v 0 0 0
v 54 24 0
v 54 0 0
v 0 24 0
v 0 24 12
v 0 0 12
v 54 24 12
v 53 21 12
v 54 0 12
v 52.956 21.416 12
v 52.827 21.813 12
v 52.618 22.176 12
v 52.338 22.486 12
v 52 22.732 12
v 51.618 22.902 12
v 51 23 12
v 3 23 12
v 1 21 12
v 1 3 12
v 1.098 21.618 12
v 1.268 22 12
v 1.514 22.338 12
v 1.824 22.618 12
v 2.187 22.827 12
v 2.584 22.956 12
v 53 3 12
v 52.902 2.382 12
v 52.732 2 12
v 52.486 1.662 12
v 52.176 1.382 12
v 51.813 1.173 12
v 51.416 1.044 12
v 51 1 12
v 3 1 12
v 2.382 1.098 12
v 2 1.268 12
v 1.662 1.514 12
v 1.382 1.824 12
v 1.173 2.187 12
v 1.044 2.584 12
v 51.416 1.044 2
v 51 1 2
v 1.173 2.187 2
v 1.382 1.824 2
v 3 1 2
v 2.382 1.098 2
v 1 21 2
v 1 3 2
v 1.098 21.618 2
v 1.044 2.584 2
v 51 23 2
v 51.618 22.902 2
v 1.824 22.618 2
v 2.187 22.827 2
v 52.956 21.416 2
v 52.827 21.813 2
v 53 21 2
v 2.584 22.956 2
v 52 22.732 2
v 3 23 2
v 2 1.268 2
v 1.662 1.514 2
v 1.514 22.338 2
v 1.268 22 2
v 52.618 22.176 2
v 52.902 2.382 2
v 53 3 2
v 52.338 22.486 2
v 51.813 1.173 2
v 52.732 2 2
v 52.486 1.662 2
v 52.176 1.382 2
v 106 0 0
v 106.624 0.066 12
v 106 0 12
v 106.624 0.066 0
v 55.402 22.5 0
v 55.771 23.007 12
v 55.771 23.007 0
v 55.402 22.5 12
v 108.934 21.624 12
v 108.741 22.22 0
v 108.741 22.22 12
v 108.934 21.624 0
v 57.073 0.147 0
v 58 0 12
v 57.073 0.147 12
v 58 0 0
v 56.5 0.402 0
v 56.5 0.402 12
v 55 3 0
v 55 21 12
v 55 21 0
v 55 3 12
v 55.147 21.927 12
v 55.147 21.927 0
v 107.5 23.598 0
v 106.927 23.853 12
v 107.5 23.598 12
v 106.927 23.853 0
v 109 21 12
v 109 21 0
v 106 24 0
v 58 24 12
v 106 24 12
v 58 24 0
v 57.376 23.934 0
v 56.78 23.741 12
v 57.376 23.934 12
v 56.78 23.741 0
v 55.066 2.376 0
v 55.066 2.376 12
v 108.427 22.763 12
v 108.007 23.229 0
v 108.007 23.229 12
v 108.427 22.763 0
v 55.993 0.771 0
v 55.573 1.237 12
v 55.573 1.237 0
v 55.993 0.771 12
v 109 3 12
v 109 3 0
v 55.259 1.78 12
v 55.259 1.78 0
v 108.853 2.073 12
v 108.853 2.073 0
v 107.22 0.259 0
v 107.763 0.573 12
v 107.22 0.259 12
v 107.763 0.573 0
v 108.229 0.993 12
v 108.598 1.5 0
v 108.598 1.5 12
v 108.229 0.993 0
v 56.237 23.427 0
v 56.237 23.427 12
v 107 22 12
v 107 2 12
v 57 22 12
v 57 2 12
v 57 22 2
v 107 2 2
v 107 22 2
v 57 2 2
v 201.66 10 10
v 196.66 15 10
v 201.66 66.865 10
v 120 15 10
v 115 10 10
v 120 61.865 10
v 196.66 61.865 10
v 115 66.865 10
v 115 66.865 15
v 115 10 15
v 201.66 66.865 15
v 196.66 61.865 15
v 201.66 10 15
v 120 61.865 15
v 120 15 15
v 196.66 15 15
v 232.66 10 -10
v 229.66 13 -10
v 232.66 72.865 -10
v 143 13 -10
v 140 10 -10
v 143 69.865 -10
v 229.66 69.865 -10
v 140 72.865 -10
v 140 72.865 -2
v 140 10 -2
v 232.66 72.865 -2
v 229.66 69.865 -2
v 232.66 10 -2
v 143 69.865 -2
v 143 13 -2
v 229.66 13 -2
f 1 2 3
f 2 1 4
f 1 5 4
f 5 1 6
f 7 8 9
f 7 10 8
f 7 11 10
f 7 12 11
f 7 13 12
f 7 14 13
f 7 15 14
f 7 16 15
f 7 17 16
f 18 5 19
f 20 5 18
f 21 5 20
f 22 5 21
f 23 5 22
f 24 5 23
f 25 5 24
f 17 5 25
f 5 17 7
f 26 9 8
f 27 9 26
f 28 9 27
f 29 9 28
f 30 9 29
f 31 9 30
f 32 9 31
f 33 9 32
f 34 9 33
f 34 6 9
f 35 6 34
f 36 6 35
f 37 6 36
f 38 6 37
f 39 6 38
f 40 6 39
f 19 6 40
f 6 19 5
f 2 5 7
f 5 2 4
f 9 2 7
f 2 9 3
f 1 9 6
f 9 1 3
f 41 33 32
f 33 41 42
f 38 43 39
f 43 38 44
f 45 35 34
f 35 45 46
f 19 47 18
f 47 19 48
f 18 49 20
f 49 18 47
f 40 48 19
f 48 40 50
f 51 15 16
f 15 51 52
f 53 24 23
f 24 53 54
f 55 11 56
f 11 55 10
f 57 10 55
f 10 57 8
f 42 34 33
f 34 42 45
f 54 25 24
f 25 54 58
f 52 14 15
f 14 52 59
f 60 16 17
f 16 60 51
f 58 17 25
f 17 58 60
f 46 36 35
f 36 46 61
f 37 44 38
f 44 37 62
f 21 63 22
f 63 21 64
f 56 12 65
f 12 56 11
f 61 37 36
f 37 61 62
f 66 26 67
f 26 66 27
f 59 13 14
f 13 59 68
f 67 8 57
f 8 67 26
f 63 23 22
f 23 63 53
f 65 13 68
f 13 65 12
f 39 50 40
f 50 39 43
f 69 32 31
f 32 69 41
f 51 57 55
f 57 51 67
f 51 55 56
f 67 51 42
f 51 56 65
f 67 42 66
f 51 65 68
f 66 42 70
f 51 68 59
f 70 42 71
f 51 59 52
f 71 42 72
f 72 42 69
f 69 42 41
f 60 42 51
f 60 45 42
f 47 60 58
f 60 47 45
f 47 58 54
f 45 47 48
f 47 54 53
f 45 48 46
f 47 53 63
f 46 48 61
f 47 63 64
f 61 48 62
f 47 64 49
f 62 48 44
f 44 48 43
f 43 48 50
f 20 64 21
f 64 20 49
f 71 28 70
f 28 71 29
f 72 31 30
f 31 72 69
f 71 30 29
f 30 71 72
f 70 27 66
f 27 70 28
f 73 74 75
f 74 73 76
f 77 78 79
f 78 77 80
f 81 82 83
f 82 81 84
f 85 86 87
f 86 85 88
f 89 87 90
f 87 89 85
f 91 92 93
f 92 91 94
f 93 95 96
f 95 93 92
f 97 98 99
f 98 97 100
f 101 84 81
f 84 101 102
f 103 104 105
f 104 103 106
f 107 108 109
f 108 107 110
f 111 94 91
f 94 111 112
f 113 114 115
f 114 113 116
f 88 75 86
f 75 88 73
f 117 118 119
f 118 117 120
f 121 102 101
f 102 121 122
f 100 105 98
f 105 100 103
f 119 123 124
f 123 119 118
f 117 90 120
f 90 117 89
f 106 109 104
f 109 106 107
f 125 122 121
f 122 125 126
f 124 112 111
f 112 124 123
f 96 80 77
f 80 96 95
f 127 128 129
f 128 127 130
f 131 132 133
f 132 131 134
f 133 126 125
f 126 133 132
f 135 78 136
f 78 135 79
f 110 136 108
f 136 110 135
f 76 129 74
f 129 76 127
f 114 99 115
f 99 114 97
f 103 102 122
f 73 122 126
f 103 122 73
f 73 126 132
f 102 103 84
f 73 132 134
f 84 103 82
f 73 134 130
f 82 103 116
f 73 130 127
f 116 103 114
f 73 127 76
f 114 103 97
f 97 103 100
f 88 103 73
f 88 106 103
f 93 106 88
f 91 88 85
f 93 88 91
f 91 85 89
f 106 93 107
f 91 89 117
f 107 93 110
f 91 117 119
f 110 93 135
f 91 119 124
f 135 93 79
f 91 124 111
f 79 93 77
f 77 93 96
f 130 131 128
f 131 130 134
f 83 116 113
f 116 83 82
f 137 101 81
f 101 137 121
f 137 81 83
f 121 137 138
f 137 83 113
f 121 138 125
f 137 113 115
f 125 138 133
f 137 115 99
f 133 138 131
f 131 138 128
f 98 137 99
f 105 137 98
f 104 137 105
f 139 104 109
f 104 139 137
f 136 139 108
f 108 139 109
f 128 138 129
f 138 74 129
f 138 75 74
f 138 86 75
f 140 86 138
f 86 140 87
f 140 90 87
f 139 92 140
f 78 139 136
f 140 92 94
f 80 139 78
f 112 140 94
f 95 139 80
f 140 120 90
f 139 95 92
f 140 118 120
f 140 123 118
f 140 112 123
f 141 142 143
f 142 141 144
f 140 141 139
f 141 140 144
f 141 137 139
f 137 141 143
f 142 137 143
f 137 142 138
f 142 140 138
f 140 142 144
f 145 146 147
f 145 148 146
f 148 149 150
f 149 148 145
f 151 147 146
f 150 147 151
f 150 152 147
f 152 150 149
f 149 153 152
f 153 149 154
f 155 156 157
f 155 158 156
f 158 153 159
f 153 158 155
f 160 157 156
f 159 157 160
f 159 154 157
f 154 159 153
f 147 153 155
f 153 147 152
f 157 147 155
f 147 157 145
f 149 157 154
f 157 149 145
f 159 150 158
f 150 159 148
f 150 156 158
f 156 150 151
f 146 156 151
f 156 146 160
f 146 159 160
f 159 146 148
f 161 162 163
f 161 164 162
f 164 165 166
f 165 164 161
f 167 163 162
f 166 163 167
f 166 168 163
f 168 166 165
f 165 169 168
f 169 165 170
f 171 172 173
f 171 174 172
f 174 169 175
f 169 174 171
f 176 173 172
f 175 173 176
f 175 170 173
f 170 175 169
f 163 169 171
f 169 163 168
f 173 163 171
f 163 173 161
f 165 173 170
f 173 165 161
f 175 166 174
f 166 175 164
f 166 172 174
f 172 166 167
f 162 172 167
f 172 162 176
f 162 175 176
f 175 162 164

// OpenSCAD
module tube (r = 0, d = 0, l = 0, 
            thick = 0, 
            bCentered = true, 
            taper_pct = 0, 
            circlip = false) // r=radius d=dia l=length 
{
    assert( r != 0 || d != 0, "specify one of radius or diameter");
    assert( l != 0 , "tube: need length 'l' to be non zero");
    assert( thick != 0, "wall thickness cannot be zero");

    punch = $preview ? .2 : 0; // stop funny view artifact

    dia = r ? r * 2 : d;

    od = ((thick > 0) ? dia + thick * 2 : dia);
    id = (thick > 0) ? dia             : dia  + thick *2; 

    
    
    if (thick > 0)
        echo ("tube\tMIN id = ", id, "od = ", od, "wall = ", thick, "center= ", bCentered);
    else
        echo ("tube\tMAX od = ", od, "id = ", id, "wall = ", thick, "center= ", bCentered);

    echo ("tube\tHeigth = ", l);
        
    if (taper_pct != 0)
    {
        echo ("tube\t*** OD expanded by ", taper_pct, "%, : bottom od = ", od * (1. +taper_pct/100), "top od = ", od);
    }
    
    assert(dia || dia < 0, "tube : missing r or d ");
    
    // if taper_pct specified, the base will always be closest to 0,0,0
    translate([ 0, 0, taper_pct == 0 ? 0: bCentered ? l/2:l  ])
    rotate([0, taper_pct == 0 ? 0 : 180, 0 ])

    difference()
    {
        // make a reese's cup
        {
            color("YELLOW", .3)
            linear_extrude(height= l, scale = 1 + taper_pct/100)
                difference()
                {
                    circle(d = od);
                    circle(d = .5);
                }
        }
    
     // hollow out reessed cup
     color("GREEN")
     translate([0, 0, -punch/2])
     linear_extrude(height= l+ punch*2, $fn=100)
     {
        circle(d = id);
        if (circlip) #square([1 + punch, od ]);
     }
    
    }
}
//==============================================================================
        
module abox (dims, 
            thick = 0, 
            bCentered = true, 
            round_out = 0, 
            round_in = 0, 
            bSolid = false,
            bHollow = false,
            elevator = 0)   // move bottom up by X
{
    punch = $preview ? .1 : 0; // stop funny view artifact
    
    assert(thick != 0, "Thick must be specified. +=outside dim, -= inside dims");
    assert(dims.z > thick, "wall thickness too large for depth of box");

    wall2 = abs(thick) * 2; // 2 walls in each direction
    wall = wall2 / 2;
    
    // box either grows inward (thick < 0) or outward (thick > 0)  from dims
    fat = dims + [ wall2, wall2, wall];
    thin = dims - [ wall2, wall2, wall];
    
    offset = (thick > 0 && bCentered == false) ? wall : 0;
    
    //echo ("abox : adjusting x,y,z by ", offset, " to move origin from  center to 0,0,0");
    translate( [ bCentered ? 0 : dims.x /2 + offset, bCentered ? 0 : dims.y /2 + offset, bCentered ? 0 : dims.z /2 + offset/2]) 
    {
        if (thick > 0)
        {   
            // wall grows outwards from users dim
            echo ("making a box, MAX INSIDE dim = ", dims, "a wall=", thick, "mm ... max outside = ", fat, " mm");
        }
        else
        {
            // wall grows inward from users dime
            echo ("making a box, MAX OUTSIDE dim = ", dims, "a wall=", thick, "mm ... min inside = ", thin, " mm");
        }
        
        // linear extrude alway works in the positive x/y plane an goes upward.
        // after calc, re-center about 0,0,0 where a bCentered cube would be
        
        translate([ 0, 0, thick > 0  ? -fat.z/2 : -dims.z/2 ])
        difference()
        {
            echo ("round_out = ", round_out);

            // MAKE SOLID BOX --------------------------------------
            router_outside = round_out ? round_out : 0;
            x = thick > 0  ? fat.x - router_outside : dims.x - router_outside;
            y = thick > 0  ? fat.y - router_outside : dims.y - router_outside;


            // MAKE PUCHNED INSIDE
            // using 'offset' it will add r on all dimensions, then round., 
            // so now you have fatter perimeter than you started with :(
            //  but at least the corners are round.
            
            // Compensate by shrinking dimension by r, 
            // and then by calling offset, offset will then add it back

            color("YELLOW", .2)

            linear_extrude(thick > 0  ? fat.z : dims.z)
            if (round_out)
            {
                offset( r= round_out, $fn=30)
                square( [x - router_outside, y - router_outside], true);
            }
            else square( [x - router_outside, y - router_outside], true);
           
            // time to punch out the inside if requested.
            if (bSolid == false)
            {
                hollow_offset = bHollow ? fat.z/2 + .2  : dims.z/2 +.2;
                // punching out inside. its either dims or thin.
                router_inside = round_in;
                echo ("round_in = ", router_inside);
                xi = thick > 0  ? dims.x  : thin.x;
                yi = thick > 0  ? dims.y : thin.y ;

                color("GREEN")

                // move 'punch' up if you need a bottom else zero (hollowed out)

                translate([ 0,0, bHollow ? -.1 : wall + elevator]) 
                linear_extrude(thick > 0  ? fat.z - wall  + hollow_offset : dims.z - wall + hollow_offset)
                //#linear_extrude(fat.z - wall  + hollow_offset)
                
                if (round_in) 
                {
                    offset( r= round_in, $fn=30)
                    square( [ xi - router_inside, yi - router_inside], true);
                }
                else
                    square( [ xi, yi], true);
            }
        }
    }
 }


// 50x25x10 box walls grow inward (-2). on center origin midpoint
// rounded outside (default), sharp corner inside(default), bCentered about 0,0,0
//color("GREEN", .9)
//abox([50,25, 10], -2, true); 


// 50x25x10 box walls grow inward (-2). on center origin midpoint
// sharp outside corners, rounded inside corners. Sit on x,y plane
color("BLUE", .9)
abox([50,20, 10], +2, round_in=2, bCentered = false);  // 50x25x10 box inside dim origin has 0,0


// 50x25x10 box walls grow inward (-2). on center origin midpoint
// sharp corners inside and out. sits on x,y plane
color("GREY", .9)//
translate([ 55, 0, 0])      
abox([50,20, 10], +2, round_out=3, false);

color("PINK", .9)//
translate([ 115, 10, 10])      
abox([86.66, 56.865, 5], -5, bHollow = true, bCentered = false); 

color("GREEN", .9)//
translate([ 140, 10, -10])      
abox([86.66, 56.865, 5], 3, bHollow = true, bCentered = false); 

/*
// 50x25x10 box walls grow inward (-2). on center origin midpoint
// round corners outside and SOLID
color("BLUE", .9)//
translate([ 55, 0, 0])      
abox([50,25, 10], +2, round_out=2, round_in=0, false, bSolid = true); // 50x25x10 box outside dim origin is 0,0
*/

//translate ([-30,-30, 0])
{
/*
    // tube outer dia  20, inner dia = (20 - 8)
    color("PINK")
    tube (d = 20, l = 20, thick = -8, bCentered = false);

    // tube, inner dia = (2* 10), outer dia = ((2*10) + 2) 
    color("PURPLE", .3)
    tube (r = 10, l = 20, thick = +2, bCentered= true);
*/
/*
    tube (d = 60, l = 20, thick = -6, bCentered = false);

    translate([0, 0, 50])
    tube (d = 60, l = 20, thick = -6, bCentered = false, taper_pct = 20, circlip = true);
    //color("GREEN")
    //tube (d = 20, l = 20, thick = -2, bCentered = false, taper = 10, circlip = true);
*/

}
